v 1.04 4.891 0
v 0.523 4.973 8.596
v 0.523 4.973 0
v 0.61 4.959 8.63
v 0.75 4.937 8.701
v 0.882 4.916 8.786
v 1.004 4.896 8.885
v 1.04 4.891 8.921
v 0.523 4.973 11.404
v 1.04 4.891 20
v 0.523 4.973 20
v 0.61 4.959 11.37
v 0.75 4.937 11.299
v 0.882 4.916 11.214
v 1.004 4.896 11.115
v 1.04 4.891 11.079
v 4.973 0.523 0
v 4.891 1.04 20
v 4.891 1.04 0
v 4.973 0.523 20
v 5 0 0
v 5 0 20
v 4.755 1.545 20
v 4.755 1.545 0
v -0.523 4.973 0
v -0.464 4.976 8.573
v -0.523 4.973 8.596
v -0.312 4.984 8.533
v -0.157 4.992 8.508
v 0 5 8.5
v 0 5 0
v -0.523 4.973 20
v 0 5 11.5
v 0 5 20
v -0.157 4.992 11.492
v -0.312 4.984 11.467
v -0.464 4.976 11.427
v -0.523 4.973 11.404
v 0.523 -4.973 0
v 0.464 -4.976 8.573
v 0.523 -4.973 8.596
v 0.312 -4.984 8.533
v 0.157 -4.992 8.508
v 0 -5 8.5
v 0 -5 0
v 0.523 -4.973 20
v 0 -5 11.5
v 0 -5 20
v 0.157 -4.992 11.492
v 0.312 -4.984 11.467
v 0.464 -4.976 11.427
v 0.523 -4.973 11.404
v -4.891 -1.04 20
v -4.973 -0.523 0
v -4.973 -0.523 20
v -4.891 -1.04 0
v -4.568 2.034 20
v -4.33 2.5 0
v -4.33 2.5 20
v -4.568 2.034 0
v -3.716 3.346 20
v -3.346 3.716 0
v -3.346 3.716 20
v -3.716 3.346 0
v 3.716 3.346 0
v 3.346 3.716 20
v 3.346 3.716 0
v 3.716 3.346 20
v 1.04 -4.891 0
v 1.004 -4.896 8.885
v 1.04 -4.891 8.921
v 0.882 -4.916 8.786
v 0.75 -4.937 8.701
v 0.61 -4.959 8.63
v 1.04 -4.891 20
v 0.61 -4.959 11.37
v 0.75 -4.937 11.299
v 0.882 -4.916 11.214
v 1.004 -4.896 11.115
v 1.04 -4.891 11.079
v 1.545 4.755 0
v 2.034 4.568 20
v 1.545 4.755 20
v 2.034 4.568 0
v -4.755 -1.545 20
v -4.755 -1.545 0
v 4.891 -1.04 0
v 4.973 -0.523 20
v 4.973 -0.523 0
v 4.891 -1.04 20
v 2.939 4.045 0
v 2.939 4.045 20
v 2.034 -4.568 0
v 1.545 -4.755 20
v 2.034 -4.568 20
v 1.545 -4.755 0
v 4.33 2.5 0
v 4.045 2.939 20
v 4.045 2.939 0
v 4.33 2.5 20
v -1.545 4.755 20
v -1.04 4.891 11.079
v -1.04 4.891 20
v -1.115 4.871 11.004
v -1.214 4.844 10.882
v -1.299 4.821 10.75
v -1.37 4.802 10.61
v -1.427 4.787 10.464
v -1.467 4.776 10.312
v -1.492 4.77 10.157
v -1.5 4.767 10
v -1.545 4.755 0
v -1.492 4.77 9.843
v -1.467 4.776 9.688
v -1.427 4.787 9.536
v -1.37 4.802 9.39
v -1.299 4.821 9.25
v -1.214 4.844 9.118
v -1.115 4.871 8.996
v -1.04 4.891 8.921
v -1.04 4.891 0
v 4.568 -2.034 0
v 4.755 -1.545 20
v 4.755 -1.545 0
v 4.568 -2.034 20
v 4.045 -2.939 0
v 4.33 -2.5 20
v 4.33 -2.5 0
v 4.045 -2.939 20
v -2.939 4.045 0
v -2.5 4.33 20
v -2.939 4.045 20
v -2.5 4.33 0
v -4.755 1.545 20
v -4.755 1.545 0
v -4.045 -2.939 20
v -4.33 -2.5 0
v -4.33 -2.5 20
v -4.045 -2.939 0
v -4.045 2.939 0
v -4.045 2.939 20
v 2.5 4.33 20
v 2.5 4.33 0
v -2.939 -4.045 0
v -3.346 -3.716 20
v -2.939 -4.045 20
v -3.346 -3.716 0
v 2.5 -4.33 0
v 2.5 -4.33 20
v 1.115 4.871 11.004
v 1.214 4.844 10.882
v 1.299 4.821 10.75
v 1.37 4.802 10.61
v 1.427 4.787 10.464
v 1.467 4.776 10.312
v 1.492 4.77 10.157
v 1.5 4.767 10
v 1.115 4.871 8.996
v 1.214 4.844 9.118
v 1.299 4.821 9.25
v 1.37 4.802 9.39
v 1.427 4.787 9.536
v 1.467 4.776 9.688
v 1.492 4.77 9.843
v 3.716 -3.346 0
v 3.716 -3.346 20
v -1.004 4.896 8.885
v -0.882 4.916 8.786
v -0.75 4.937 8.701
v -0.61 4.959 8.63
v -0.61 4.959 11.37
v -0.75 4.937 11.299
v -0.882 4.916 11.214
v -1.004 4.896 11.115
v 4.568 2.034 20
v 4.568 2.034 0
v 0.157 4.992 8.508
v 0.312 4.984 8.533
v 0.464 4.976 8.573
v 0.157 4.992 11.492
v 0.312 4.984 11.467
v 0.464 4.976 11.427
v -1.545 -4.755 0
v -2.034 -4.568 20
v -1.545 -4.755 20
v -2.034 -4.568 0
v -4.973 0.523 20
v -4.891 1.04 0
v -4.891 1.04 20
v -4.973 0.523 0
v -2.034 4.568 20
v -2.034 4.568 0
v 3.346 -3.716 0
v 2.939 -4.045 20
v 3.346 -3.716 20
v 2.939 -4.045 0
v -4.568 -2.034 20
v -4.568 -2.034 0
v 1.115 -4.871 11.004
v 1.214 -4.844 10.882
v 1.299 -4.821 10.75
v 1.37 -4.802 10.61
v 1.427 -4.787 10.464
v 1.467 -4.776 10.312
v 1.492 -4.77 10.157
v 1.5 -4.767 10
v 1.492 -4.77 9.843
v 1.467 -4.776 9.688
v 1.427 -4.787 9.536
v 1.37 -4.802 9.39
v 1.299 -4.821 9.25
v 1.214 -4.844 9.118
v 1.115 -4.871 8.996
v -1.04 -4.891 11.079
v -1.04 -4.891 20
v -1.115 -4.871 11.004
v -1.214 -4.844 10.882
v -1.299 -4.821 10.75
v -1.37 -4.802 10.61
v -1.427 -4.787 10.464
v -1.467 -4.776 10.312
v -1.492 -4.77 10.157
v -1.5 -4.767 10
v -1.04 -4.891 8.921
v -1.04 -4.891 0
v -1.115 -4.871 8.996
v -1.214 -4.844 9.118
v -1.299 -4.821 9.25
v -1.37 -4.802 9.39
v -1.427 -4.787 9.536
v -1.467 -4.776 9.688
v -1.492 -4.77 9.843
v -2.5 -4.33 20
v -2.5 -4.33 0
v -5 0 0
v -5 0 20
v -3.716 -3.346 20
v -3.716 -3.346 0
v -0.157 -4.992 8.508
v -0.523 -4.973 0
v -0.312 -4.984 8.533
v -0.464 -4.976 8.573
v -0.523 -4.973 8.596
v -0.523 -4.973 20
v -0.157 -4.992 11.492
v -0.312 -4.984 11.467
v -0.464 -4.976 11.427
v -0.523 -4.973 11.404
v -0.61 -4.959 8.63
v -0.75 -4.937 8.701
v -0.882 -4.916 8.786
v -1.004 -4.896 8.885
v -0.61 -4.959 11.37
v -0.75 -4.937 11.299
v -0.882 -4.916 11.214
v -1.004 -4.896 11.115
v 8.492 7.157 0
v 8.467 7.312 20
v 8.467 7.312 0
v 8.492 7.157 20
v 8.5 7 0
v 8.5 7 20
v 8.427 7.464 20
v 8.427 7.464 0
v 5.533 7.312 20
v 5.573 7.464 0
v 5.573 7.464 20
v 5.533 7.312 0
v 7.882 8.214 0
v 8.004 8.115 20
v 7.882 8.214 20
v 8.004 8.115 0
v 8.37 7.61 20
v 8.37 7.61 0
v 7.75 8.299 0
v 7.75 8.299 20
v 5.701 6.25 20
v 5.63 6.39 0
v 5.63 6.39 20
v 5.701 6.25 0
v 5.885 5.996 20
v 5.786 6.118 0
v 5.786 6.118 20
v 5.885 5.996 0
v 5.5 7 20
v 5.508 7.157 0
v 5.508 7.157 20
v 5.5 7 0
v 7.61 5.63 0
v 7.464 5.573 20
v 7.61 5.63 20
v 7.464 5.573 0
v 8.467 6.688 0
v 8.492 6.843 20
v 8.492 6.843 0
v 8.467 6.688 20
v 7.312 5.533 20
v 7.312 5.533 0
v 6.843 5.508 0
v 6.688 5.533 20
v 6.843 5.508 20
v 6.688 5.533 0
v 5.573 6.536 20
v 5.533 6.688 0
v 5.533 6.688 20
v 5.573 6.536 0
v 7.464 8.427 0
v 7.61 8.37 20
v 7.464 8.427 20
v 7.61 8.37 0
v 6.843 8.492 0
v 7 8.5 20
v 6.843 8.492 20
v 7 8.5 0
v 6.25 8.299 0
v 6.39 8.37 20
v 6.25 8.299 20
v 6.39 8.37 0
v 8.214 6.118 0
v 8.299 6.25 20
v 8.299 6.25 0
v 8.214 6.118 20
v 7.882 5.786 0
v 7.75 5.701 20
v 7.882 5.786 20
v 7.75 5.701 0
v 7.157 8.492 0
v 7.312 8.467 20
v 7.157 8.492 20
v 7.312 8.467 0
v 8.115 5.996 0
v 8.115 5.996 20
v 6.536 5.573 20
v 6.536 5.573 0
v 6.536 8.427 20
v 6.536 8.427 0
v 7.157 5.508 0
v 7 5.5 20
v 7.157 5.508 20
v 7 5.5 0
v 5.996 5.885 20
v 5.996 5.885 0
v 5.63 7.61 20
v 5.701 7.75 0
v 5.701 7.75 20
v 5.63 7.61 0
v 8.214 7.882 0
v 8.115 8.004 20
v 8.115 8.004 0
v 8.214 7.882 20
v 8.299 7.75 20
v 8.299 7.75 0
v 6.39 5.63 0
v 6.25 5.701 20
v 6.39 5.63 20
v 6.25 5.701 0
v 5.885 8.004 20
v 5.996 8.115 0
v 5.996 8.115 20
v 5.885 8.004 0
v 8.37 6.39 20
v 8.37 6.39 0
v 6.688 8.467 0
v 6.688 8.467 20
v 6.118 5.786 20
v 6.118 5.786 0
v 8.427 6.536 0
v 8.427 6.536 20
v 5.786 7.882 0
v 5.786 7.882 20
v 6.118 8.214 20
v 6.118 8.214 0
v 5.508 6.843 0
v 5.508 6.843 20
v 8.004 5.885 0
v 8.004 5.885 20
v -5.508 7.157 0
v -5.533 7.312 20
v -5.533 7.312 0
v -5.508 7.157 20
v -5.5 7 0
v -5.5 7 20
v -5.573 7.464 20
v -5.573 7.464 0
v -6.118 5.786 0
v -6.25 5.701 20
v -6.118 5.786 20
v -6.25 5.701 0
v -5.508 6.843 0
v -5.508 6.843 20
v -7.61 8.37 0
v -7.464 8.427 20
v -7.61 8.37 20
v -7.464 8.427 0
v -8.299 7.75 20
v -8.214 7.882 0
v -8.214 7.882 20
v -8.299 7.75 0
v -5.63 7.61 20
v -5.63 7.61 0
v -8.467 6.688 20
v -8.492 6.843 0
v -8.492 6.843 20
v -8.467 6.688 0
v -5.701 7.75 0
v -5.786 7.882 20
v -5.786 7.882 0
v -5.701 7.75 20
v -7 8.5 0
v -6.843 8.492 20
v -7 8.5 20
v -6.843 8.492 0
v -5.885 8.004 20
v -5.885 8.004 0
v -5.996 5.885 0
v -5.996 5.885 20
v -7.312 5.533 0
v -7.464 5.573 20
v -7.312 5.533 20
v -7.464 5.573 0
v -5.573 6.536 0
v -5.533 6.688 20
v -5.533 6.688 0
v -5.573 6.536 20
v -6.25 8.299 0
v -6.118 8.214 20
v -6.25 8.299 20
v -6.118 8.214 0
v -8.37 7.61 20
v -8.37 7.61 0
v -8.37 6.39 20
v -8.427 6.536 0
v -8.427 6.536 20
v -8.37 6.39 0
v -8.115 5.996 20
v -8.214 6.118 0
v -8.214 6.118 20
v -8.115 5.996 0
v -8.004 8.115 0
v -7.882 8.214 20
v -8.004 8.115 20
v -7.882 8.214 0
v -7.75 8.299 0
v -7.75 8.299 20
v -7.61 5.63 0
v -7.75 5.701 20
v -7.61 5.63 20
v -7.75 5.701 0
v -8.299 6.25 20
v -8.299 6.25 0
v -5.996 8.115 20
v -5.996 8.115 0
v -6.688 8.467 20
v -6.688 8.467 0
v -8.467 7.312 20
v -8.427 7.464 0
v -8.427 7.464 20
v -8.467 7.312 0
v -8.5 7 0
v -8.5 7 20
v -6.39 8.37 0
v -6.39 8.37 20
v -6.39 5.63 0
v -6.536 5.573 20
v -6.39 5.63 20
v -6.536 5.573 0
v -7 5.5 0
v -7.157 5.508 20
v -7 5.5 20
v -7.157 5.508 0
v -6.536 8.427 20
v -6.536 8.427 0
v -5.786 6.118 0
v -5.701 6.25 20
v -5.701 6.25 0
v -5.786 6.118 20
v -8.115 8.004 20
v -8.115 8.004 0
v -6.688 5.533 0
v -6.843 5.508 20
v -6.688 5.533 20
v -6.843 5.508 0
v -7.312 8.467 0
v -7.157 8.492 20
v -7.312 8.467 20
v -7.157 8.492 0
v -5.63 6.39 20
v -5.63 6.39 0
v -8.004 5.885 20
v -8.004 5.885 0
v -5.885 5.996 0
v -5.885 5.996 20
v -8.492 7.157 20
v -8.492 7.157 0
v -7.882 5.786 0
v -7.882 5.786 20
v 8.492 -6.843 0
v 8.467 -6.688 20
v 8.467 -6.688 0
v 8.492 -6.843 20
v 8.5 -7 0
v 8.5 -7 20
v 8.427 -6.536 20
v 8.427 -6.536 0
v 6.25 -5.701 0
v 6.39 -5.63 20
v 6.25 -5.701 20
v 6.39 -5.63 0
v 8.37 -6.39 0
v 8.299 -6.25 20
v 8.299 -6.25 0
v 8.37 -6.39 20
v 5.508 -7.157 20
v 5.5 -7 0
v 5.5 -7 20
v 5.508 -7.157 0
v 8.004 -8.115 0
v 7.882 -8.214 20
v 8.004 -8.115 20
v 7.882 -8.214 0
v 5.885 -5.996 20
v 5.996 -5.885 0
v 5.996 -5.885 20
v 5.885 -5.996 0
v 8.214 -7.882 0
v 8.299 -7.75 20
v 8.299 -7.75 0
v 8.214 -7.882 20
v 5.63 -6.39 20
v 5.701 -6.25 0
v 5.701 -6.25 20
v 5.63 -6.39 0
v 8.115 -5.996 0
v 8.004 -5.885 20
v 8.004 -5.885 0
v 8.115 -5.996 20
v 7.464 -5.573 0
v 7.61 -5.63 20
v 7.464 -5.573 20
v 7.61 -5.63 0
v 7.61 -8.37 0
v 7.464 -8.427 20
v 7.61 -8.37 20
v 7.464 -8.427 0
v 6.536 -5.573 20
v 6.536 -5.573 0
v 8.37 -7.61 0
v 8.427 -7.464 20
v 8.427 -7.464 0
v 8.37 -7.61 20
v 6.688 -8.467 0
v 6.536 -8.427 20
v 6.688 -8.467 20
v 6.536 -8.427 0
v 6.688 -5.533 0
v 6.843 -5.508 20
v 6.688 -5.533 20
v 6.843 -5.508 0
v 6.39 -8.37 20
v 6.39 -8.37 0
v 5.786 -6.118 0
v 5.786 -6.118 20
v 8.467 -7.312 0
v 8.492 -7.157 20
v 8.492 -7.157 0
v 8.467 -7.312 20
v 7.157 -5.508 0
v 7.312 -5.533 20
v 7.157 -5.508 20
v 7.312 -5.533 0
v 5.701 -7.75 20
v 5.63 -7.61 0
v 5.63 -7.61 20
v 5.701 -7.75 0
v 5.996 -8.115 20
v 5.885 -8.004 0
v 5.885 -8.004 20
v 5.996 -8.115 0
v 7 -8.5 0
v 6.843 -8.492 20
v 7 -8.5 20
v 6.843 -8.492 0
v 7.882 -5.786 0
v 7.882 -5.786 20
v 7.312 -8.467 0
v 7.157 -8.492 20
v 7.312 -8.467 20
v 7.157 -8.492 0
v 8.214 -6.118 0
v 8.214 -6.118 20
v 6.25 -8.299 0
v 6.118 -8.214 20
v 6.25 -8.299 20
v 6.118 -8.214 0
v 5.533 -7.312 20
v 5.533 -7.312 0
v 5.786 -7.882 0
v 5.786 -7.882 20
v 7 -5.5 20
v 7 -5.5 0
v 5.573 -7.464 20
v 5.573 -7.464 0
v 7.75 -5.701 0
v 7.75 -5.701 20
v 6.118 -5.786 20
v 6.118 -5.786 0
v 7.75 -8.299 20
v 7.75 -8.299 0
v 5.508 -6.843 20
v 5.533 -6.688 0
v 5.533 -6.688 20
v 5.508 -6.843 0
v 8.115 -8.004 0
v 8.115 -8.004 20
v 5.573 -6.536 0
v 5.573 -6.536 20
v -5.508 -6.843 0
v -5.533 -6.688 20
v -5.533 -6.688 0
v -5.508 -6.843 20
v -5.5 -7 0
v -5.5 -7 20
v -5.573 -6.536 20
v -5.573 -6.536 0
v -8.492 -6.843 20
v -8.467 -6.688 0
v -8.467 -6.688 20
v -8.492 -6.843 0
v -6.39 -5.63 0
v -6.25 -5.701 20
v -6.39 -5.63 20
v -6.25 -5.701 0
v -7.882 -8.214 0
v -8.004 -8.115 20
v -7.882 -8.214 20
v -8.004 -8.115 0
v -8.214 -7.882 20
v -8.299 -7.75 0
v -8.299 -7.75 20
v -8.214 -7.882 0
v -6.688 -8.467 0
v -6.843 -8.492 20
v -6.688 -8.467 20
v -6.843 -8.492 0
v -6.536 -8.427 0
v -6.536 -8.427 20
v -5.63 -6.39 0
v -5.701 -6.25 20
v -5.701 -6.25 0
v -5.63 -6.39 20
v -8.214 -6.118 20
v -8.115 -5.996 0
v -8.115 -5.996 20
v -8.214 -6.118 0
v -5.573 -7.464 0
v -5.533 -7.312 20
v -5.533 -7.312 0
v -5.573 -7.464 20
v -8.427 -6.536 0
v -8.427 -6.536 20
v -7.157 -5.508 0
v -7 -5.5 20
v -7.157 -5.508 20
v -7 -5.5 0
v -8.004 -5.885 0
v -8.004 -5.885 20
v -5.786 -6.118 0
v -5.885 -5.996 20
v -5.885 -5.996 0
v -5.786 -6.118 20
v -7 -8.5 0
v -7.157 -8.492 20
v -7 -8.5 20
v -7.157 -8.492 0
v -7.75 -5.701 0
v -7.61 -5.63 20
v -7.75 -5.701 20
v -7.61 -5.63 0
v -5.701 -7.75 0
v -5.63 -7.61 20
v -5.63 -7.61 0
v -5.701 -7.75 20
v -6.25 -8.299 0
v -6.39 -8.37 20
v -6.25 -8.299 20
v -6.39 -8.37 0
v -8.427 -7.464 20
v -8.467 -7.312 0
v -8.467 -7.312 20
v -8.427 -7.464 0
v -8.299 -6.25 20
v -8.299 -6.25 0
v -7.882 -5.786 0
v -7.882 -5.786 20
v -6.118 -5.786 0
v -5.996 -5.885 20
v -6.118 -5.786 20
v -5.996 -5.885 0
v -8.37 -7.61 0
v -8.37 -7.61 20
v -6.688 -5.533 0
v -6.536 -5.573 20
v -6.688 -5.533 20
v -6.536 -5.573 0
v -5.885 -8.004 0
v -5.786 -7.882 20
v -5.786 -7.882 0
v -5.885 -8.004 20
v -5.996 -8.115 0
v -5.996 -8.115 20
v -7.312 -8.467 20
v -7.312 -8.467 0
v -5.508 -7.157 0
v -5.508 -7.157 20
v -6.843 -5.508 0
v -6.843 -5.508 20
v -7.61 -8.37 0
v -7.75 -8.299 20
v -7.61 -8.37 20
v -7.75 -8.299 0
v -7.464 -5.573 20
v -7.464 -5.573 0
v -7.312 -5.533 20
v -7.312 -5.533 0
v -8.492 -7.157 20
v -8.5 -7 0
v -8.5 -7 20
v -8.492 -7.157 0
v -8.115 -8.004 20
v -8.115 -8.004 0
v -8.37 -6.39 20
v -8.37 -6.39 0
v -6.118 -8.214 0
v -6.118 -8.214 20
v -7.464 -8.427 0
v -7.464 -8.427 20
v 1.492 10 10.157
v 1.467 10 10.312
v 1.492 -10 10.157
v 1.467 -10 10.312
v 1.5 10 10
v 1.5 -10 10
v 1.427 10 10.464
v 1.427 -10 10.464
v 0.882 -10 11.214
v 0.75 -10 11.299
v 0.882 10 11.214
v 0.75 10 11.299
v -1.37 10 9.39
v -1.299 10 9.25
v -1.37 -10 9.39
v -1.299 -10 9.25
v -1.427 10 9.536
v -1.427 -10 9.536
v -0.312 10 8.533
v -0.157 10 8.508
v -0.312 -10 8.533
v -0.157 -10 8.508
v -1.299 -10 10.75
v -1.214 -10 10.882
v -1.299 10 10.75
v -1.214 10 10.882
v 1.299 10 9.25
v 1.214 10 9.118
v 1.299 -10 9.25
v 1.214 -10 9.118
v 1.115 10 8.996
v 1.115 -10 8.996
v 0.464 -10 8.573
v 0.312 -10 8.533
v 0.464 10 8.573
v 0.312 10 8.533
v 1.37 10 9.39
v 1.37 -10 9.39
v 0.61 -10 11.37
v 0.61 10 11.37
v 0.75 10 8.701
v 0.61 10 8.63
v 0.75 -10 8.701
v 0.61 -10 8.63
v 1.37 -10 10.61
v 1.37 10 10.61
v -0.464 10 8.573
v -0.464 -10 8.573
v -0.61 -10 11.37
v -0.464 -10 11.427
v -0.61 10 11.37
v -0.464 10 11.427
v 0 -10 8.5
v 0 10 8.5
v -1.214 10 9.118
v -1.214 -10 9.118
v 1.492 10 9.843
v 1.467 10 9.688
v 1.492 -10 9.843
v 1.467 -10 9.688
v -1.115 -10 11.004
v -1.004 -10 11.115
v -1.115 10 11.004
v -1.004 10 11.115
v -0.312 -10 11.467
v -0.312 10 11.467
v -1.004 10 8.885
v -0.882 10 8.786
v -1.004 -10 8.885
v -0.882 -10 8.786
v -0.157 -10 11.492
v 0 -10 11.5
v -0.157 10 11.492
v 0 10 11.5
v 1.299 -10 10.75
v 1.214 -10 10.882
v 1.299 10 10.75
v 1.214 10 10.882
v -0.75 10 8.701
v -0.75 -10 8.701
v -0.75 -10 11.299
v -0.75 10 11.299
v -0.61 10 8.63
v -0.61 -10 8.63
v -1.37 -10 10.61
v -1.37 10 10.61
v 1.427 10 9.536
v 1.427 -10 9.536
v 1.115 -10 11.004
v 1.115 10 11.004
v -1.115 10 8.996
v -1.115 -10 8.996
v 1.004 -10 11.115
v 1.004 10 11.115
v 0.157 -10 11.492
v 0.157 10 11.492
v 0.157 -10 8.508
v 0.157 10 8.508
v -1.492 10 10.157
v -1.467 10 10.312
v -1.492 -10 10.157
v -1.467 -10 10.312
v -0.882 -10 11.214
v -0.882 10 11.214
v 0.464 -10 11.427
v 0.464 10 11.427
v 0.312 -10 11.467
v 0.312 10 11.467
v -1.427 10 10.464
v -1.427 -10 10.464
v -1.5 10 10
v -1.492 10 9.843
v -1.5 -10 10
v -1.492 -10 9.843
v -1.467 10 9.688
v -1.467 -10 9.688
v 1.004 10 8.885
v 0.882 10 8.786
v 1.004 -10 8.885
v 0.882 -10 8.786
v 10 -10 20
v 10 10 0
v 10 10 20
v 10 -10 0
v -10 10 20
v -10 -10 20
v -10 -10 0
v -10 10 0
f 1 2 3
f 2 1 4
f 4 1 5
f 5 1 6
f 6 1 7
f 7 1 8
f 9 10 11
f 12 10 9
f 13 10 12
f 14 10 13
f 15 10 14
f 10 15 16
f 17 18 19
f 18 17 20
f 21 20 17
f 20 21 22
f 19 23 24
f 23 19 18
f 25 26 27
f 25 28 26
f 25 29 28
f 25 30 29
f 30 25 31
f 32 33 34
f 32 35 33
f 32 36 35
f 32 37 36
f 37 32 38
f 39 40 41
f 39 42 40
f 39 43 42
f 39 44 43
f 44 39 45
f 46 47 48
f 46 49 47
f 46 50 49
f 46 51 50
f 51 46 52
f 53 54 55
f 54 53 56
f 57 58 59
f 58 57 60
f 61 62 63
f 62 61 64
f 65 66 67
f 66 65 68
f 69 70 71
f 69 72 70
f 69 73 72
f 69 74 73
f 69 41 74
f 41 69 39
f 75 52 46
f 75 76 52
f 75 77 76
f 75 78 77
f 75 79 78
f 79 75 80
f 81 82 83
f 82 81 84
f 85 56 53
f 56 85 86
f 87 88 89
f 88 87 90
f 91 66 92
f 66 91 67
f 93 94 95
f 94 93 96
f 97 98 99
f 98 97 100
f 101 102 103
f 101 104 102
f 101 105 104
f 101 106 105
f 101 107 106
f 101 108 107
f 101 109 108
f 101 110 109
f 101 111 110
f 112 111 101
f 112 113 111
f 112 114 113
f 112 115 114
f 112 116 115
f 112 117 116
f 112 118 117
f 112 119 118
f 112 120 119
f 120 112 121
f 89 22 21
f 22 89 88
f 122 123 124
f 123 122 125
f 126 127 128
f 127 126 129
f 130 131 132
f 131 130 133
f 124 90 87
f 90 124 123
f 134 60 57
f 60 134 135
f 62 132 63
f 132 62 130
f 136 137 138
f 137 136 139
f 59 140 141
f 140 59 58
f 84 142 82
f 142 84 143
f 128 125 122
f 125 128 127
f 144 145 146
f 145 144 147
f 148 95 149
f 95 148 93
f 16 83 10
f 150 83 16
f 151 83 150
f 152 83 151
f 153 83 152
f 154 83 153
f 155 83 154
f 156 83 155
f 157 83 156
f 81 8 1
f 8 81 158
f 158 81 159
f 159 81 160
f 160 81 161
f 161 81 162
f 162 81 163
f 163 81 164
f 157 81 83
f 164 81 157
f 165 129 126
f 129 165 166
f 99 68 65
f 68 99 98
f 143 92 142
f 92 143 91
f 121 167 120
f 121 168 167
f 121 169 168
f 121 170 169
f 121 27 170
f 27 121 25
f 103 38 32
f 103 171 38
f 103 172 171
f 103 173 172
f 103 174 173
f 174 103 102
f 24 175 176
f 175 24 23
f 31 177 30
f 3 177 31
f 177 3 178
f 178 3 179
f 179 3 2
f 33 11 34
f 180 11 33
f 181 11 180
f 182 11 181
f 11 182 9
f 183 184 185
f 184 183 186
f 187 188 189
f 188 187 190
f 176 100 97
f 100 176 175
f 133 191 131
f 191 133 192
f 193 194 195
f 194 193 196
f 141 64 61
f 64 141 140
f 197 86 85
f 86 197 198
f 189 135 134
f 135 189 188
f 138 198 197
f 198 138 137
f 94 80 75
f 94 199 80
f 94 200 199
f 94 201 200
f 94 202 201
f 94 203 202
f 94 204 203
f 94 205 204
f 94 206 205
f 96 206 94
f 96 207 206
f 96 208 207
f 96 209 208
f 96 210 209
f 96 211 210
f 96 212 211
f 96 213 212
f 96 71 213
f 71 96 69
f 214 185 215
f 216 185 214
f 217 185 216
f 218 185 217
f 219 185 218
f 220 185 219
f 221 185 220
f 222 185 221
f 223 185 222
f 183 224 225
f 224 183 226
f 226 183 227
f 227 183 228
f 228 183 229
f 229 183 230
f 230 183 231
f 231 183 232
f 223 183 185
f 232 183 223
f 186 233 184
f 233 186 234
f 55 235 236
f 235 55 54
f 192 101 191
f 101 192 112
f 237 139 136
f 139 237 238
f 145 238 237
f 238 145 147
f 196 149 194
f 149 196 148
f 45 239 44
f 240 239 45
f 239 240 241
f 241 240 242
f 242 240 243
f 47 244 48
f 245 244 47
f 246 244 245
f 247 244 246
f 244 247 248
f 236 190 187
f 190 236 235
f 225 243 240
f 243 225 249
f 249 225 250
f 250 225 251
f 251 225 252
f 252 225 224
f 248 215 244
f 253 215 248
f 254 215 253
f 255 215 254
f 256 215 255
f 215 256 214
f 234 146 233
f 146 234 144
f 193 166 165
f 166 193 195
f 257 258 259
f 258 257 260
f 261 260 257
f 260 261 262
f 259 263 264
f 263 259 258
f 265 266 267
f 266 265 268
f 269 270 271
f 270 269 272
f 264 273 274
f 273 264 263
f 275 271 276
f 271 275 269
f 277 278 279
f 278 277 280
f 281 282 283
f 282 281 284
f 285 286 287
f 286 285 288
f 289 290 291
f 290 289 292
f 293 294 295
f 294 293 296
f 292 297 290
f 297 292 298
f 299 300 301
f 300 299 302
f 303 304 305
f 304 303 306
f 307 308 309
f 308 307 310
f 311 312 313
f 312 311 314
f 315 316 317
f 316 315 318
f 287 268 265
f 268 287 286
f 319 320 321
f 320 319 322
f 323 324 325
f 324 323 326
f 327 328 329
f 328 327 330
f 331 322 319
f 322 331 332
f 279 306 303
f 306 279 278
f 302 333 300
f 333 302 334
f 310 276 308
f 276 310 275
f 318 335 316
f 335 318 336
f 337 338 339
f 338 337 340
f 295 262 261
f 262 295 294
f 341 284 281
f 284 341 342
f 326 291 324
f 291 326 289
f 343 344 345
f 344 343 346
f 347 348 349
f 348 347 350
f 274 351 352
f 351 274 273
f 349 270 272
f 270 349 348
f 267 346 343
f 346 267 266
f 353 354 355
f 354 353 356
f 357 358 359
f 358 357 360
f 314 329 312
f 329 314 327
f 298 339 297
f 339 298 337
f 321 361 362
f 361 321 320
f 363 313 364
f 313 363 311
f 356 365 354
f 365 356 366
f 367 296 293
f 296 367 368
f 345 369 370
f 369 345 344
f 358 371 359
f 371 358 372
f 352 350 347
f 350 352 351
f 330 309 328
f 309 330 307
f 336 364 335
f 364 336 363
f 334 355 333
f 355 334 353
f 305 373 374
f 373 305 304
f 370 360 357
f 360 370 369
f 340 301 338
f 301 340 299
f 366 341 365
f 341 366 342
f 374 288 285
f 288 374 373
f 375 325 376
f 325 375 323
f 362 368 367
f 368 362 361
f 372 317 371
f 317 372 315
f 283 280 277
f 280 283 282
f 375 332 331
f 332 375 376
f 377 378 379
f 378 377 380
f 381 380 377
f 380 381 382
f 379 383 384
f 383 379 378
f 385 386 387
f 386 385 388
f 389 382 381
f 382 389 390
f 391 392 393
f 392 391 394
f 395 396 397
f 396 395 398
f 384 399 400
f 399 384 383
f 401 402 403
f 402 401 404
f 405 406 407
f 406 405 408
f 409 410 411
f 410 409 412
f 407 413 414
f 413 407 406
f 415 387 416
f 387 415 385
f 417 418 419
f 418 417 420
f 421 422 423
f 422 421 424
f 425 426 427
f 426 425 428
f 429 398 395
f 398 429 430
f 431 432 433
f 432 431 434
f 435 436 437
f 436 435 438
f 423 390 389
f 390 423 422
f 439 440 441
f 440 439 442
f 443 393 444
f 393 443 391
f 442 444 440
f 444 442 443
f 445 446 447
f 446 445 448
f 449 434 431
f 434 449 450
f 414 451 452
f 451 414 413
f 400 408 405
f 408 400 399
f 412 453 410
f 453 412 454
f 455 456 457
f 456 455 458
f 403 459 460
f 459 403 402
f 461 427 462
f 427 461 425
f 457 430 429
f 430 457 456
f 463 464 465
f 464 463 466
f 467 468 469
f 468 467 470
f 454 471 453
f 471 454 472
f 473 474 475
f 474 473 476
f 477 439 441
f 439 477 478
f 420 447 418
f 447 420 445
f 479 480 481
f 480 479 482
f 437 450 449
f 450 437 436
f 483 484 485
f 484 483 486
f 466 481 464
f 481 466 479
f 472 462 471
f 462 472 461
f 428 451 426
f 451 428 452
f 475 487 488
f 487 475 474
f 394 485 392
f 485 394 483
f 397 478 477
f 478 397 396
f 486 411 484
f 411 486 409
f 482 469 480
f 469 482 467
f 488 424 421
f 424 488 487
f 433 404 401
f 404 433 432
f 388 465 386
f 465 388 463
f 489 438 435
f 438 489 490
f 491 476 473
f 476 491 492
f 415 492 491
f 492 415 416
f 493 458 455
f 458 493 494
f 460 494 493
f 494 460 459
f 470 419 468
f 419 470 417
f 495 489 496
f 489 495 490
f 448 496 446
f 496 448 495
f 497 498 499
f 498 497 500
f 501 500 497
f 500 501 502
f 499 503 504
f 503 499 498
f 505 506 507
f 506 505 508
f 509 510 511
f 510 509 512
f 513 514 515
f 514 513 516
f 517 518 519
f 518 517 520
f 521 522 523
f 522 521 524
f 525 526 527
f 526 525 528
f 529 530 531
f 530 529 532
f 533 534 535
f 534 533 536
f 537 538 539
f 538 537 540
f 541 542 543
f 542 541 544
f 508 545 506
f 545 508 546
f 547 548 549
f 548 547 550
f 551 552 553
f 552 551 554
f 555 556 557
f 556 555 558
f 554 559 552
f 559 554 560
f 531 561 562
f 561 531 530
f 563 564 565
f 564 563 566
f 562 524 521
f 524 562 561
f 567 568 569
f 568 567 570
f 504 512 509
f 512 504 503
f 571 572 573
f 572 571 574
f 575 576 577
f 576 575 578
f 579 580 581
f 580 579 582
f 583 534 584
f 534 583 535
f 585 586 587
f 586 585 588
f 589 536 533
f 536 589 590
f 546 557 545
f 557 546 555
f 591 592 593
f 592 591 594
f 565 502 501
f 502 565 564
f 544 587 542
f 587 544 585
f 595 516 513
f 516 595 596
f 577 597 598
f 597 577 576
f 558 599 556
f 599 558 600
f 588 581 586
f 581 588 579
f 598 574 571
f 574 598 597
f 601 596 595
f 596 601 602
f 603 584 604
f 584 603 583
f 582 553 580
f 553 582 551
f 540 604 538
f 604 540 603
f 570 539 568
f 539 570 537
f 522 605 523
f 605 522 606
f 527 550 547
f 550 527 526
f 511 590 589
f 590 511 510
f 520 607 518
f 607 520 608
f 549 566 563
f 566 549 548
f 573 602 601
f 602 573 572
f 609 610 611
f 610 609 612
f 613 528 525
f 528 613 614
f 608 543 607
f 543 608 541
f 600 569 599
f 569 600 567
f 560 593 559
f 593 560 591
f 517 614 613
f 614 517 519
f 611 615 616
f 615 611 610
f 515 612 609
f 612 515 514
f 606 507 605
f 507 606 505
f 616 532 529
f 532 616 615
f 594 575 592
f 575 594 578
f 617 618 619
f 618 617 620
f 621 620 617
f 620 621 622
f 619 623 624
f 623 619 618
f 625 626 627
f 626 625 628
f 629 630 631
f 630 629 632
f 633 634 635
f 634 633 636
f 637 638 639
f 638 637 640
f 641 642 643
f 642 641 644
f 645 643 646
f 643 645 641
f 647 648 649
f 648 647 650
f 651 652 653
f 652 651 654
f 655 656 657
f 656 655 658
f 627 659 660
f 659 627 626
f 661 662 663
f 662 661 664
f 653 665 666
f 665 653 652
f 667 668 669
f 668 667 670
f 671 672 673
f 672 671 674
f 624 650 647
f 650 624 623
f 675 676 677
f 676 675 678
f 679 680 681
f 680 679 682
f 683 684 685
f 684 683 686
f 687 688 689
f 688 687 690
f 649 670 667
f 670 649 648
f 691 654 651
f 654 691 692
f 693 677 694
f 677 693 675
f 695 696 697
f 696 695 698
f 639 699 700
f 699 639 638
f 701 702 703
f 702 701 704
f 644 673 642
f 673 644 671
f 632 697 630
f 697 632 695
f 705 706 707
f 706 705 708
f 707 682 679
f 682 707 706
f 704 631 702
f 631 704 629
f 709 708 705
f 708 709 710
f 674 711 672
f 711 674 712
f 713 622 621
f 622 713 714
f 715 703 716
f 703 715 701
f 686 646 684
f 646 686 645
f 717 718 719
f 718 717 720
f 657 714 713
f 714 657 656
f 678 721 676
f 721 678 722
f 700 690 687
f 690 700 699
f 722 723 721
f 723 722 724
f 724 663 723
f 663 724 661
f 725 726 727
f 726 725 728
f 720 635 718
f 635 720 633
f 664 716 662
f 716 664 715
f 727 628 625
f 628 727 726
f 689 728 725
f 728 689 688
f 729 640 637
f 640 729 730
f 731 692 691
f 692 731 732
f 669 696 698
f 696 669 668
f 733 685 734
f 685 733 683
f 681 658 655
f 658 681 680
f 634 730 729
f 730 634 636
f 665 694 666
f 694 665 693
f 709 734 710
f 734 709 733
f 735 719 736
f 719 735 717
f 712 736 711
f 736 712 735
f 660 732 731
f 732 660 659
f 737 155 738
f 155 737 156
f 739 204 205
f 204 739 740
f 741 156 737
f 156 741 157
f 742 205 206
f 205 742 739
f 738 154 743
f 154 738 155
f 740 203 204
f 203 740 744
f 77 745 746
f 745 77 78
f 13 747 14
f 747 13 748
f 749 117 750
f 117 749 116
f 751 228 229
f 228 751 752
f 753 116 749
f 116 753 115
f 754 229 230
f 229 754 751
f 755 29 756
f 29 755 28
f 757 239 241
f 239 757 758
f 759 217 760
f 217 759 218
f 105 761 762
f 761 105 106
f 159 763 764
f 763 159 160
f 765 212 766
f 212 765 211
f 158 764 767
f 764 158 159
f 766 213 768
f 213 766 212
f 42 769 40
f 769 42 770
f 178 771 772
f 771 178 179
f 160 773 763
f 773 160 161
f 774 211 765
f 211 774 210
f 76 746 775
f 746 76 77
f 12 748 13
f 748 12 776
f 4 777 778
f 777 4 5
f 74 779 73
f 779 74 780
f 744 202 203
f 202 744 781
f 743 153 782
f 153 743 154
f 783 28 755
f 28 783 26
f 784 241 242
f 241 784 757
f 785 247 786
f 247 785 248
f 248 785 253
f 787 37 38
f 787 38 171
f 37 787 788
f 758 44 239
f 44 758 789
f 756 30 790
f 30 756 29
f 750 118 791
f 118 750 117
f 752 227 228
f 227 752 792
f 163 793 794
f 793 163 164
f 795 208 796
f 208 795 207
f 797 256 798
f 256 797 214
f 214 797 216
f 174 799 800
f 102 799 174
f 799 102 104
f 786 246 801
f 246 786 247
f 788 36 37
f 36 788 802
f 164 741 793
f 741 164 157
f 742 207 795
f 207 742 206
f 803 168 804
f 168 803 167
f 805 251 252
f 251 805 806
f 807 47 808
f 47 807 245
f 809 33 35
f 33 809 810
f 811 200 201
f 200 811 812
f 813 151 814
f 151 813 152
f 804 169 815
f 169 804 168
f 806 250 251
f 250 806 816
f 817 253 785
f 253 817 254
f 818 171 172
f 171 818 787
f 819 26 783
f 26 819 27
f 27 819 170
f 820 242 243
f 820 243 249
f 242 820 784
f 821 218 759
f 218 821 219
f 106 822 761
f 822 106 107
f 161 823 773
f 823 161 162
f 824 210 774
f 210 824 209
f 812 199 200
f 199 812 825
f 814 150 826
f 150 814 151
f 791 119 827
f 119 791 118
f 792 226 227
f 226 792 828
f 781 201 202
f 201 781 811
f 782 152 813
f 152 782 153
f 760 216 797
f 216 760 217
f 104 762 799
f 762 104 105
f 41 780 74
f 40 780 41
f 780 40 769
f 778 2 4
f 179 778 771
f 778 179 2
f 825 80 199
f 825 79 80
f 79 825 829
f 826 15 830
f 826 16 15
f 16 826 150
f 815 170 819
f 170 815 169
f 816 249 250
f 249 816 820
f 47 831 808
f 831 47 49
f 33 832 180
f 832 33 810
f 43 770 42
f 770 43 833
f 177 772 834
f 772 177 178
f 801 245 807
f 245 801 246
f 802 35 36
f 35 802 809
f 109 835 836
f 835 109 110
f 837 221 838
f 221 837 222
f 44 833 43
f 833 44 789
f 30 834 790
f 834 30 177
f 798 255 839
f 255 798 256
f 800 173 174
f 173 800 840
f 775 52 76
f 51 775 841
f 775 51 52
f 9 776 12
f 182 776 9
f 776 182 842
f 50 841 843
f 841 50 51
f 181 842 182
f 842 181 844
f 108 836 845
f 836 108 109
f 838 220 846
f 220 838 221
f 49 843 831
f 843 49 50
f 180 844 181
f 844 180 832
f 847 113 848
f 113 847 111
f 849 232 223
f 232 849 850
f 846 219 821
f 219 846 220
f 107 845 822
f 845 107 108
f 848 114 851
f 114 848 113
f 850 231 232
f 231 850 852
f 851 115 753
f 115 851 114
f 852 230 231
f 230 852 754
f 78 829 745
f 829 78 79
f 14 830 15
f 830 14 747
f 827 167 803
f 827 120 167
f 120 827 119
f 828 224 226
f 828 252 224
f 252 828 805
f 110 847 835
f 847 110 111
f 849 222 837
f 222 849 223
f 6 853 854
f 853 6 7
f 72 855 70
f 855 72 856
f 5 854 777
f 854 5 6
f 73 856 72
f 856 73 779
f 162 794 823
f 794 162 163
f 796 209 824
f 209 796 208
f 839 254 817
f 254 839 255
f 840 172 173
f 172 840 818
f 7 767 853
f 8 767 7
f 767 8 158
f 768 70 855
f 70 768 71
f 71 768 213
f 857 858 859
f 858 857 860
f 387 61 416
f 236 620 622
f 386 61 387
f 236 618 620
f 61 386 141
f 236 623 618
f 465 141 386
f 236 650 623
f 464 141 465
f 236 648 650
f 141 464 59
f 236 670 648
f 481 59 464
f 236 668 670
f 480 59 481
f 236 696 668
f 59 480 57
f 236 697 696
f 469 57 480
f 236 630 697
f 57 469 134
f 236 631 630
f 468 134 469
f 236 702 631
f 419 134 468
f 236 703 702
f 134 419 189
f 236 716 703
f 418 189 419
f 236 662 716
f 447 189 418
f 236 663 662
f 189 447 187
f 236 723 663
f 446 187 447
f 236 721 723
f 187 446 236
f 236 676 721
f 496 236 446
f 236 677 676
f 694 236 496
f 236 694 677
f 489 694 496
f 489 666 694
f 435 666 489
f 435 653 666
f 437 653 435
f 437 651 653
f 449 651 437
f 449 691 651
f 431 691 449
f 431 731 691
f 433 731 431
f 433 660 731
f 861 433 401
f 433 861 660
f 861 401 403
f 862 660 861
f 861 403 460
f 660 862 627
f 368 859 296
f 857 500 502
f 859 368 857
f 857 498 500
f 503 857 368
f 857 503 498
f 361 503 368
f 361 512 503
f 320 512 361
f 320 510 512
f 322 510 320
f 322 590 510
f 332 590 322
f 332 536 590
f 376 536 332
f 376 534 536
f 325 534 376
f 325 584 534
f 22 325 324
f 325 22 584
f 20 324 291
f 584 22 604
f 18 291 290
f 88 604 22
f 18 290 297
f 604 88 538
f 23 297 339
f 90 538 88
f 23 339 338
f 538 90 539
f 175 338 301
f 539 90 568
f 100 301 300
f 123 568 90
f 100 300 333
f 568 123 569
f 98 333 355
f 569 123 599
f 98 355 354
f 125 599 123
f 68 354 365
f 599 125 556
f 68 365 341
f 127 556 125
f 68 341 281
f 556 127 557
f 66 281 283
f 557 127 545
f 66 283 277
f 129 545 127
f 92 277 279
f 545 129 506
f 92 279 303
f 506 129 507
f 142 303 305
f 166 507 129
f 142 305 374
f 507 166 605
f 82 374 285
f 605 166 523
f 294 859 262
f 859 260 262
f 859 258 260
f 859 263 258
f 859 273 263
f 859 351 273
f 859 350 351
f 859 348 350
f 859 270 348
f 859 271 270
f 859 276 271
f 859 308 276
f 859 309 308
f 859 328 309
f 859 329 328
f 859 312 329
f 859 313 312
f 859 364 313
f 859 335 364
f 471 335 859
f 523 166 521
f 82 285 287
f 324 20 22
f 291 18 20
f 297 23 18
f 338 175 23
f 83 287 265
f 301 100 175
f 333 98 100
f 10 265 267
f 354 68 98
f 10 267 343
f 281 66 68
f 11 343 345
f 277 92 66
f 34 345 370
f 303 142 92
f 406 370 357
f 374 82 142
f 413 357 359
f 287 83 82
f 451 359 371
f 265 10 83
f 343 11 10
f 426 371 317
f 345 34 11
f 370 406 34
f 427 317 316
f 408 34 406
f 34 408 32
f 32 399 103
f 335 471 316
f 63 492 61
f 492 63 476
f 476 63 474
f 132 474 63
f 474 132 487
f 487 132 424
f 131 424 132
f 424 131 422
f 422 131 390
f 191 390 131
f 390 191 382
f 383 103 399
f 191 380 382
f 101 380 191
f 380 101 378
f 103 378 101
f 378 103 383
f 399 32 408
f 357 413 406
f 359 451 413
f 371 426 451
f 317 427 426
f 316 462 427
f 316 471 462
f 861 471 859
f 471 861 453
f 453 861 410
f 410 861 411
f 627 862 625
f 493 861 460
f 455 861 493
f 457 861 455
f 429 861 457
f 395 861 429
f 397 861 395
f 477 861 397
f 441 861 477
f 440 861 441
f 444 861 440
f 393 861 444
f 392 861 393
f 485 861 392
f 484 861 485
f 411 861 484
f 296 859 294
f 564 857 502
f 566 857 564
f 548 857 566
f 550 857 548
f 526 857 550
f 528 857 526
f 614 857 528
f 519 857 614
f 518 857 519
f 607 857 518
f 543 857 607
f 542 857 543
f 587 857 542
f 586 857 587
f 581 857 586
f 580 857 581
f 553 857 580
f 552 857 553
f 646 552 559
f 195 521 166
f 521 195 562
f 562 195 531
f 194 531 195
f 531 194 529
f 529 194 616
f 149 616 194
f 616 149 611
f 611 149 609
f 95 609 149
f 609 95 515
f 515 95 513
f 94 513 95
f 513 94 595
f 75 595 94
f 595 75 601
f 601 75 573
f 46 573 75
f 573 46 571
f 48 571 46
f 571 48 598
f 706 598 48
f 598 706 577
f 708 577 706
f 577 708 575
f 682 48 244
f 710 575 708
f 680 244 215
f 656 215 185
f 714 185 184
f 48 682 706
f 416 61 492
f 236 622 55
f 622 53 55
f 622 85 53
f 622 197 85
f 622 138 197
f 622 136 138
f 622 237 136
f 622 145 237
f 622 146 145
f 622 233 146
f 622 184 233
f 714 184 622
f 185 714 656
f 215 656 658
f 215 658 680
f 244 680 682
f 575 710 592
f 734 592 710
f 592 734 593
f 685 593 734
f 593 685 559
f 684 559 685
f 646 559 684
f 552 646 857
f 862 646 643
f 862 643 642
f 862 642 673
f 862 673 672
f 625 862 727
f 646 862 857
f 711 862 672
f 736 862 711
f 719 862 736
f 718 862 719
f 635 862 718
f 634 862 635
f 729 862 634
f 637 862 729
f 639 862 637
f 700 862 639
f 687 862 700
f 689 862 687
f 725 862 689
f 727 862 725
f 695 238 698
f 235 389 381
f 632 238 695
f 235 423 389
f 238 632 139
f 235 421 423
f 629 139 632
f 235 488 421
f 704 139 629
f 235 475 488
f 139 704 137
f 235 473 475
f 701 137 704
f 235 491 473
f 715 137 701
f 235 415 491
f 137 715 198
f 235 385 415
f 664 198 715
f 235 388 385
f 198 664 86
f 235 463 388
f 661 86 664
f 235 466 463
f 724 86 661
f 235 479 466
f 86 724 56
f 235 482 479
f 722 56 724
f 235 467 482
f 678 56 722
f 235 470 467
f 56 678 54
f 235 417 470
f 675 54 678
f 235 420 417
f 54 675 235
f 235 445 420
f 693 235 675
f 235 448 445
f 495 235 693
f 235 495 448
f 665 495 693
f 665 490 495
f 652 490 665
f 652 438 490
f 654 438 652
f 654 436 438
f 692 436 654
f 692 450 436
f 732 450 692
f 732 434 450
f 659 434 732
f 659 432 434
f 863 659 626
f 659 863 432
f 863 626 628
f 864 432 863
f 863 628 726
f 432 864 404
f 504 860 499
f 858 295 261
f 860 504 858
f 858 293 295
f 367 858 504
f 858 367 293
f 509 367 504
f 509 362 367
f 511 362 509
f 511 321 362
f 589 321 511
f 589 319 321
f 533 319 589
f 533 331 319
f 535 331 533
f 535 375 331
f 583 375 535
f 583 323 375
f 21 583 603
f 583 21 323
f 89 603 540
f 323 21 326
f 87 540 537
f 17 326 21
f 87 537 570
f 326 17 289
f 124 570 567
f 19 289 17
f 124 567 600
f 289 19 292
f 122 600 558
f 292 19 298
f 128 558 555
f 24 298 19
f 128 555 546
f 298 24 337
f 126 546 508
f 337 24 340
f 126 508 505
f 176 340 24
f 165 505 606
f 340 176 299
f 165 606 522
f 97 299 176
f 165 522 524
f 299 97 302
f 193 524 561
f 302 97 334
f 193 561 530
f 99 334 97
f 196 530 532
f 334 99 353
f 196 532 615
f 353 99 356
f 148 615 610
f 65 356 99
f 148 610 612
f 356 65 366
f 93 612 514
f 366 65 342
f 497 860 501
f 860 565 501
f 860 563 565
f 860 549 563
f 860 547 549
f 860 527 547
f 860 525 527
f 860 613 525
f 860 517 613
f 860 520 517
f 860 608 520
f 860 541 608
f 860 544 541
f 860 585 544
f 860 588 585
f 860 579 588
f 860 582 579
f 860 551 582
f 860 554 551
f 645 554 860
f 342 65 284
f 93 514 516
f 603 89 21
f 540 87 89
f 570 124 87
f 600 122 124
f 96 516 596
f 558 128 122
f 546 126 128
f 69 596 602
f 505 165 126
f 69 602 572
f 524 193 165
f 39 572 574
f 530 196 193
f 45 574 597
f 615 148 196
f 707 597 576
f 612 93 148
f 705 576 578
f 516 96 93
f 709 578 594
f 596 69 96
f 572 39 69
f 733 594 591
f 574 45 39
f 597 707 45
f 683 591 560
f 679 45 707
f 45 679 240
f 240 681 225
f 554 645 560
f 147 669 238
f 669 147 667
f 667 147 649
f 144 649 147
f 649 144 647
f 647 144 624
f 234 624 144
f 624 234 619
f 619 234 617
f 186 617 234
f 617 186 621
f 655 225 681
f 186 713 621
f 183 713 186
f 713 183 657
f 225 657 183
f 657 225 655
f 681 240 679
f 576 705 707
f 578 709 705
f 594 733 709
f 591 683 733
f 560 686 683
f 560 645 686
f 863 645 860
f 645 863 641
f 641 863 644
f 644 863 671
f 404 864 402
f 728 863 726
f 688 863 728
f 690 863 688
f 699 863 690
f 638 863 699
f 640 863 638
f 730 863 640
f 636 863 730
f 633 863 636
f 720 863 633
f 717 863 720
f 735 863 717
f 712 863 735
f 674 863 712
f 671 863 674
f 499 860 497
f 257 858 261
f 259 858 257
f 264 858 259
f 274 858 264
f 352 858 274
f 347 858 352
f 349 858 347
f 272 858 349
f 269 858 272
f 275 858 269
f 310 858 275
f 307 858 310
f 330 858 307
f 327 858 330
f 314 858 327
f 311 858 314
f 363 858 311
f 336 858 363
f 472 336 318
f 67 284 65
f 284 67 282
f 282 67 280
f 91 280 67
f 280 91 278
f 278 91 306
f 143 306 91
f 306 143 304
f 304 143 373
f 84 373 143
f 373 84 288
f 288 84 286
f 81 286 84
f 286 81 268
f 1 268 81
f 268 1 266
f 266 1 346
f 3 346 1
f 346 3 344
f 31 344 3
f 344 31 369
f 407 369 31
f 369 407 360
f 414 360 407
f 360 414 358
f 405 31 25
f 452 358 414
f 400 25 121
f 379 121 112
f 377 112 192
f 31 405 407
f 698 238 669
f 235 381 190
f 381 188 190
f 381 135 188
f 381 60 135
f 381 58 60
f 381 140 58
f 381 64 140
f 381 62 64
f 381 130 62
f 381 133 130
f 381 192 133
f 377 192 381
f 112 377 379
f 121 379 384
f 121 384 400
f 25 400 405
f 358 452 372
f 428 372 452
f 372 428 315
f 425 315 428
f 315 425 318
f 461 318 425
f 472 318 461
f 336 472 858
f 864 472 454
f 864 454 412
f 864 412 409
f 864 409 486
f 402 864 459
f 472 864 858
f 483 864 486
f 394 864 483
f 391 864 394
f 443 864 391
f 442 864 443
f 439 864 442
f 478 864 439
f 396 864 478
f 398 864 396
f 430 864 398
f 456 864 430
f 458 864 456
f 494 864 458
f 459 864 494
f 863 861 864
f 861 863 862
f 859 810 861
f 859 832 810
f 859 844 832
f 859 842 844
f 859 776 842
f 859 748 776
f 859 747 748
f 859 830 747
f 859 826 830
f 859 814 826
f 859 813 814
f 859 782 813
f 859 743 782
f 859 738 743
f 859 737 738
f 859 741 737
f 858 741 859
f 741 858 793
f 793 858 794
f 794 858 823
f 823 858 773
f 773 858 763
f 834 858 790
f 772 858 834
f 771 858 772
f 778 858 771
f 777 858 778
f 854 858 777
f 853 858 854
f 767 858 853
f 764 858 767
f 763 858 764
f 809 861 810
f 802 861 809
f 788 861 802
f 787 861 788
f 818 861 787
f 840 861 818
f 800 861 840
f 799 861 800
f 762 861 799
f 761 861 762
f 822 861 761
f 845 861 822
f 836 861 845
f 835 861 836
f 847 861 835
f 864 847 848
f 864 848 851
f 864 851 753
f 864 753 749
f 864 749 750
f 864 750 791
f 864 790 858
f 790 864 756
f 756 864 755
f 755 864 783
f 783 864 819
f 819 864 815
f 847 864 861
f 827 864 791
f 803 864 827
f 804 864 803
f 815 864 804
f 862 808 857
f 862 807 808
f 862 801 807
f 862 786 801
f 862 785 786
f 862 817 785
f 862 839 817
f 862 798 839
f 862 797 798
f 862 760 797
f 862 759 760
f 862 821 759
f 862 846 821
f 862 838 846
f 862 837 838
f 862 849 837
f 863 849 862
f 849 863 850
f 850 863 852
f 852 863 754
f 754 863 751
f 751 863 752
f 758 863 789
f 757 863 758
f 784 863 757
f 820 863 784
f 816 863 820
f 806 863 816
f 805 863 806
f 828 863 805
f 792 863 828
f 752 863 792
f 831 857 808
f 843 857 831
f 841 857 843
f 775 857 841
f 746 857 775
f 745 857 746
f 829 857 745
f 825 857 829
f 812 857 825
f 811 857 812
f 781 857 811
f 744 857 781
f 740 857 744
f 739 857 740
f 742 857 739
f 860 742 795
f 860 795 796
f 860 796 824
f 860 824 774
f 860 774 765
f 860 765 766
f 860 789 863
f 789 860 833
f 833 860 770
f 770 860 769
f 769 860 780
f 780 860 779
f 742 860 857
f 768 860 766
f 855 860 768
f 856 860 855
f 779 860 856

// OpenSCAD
// diameter of the rod
rod_dia     = 10;

// diameter of the screw holes
screw_dia   = 3;

// linear distance between the vertical screw holes
screw_dist  = 14;

// width (x and y) of the block
cube_width  = 20;

// height of the block
cube_height = 20;

difference()
{
  translate([-cube_width/2,-cube_width/2,0]) cube(size=[cube_width,cube_width,cube_height]);  
  union()
  {  
    translate([0,0,cube_height/2]) cylinder(h=cube_height+2,r1=rod_dia/2,r2=rod_dia/2,center=true, $fn=60);
// vert screw holes
    translate([screw_dist/2,screw_dist/2,cube_height/2]) cylinder(h=cube_height+2,r1=screw_dia/2,r2=screw_dia/2,center=true, $fn=60);
    translate([-screw_dist/2,screw_dist/2,cube_height/2]) cylinder(h=cube_height+2,r1=screw_dia/2,r2=screw_dia/2,center=true, $fn=60);
    translate([screw_dist/2,-screw_dist/2,cube_height/2]) cylinder(h=cube_height+2,r1=screw_dia/2,r2=screw_dia/2,center=true, $fn=60);
    translate([-screw_dist/2,-screw_dist/2,cube_height/2]) cylinder(h=cube_height+2,r1=screw_dia/2,r2=screw_dia/2,center=true, $fn=60);
// hor screw hole      
    translate([0,0,cube_height/2]) rotate([90,0,0]) cylinder(h=cube_width+2,r1=screw_dia/2,r2=screw_dia/2,center=true, $fn=60);
  }    
}
